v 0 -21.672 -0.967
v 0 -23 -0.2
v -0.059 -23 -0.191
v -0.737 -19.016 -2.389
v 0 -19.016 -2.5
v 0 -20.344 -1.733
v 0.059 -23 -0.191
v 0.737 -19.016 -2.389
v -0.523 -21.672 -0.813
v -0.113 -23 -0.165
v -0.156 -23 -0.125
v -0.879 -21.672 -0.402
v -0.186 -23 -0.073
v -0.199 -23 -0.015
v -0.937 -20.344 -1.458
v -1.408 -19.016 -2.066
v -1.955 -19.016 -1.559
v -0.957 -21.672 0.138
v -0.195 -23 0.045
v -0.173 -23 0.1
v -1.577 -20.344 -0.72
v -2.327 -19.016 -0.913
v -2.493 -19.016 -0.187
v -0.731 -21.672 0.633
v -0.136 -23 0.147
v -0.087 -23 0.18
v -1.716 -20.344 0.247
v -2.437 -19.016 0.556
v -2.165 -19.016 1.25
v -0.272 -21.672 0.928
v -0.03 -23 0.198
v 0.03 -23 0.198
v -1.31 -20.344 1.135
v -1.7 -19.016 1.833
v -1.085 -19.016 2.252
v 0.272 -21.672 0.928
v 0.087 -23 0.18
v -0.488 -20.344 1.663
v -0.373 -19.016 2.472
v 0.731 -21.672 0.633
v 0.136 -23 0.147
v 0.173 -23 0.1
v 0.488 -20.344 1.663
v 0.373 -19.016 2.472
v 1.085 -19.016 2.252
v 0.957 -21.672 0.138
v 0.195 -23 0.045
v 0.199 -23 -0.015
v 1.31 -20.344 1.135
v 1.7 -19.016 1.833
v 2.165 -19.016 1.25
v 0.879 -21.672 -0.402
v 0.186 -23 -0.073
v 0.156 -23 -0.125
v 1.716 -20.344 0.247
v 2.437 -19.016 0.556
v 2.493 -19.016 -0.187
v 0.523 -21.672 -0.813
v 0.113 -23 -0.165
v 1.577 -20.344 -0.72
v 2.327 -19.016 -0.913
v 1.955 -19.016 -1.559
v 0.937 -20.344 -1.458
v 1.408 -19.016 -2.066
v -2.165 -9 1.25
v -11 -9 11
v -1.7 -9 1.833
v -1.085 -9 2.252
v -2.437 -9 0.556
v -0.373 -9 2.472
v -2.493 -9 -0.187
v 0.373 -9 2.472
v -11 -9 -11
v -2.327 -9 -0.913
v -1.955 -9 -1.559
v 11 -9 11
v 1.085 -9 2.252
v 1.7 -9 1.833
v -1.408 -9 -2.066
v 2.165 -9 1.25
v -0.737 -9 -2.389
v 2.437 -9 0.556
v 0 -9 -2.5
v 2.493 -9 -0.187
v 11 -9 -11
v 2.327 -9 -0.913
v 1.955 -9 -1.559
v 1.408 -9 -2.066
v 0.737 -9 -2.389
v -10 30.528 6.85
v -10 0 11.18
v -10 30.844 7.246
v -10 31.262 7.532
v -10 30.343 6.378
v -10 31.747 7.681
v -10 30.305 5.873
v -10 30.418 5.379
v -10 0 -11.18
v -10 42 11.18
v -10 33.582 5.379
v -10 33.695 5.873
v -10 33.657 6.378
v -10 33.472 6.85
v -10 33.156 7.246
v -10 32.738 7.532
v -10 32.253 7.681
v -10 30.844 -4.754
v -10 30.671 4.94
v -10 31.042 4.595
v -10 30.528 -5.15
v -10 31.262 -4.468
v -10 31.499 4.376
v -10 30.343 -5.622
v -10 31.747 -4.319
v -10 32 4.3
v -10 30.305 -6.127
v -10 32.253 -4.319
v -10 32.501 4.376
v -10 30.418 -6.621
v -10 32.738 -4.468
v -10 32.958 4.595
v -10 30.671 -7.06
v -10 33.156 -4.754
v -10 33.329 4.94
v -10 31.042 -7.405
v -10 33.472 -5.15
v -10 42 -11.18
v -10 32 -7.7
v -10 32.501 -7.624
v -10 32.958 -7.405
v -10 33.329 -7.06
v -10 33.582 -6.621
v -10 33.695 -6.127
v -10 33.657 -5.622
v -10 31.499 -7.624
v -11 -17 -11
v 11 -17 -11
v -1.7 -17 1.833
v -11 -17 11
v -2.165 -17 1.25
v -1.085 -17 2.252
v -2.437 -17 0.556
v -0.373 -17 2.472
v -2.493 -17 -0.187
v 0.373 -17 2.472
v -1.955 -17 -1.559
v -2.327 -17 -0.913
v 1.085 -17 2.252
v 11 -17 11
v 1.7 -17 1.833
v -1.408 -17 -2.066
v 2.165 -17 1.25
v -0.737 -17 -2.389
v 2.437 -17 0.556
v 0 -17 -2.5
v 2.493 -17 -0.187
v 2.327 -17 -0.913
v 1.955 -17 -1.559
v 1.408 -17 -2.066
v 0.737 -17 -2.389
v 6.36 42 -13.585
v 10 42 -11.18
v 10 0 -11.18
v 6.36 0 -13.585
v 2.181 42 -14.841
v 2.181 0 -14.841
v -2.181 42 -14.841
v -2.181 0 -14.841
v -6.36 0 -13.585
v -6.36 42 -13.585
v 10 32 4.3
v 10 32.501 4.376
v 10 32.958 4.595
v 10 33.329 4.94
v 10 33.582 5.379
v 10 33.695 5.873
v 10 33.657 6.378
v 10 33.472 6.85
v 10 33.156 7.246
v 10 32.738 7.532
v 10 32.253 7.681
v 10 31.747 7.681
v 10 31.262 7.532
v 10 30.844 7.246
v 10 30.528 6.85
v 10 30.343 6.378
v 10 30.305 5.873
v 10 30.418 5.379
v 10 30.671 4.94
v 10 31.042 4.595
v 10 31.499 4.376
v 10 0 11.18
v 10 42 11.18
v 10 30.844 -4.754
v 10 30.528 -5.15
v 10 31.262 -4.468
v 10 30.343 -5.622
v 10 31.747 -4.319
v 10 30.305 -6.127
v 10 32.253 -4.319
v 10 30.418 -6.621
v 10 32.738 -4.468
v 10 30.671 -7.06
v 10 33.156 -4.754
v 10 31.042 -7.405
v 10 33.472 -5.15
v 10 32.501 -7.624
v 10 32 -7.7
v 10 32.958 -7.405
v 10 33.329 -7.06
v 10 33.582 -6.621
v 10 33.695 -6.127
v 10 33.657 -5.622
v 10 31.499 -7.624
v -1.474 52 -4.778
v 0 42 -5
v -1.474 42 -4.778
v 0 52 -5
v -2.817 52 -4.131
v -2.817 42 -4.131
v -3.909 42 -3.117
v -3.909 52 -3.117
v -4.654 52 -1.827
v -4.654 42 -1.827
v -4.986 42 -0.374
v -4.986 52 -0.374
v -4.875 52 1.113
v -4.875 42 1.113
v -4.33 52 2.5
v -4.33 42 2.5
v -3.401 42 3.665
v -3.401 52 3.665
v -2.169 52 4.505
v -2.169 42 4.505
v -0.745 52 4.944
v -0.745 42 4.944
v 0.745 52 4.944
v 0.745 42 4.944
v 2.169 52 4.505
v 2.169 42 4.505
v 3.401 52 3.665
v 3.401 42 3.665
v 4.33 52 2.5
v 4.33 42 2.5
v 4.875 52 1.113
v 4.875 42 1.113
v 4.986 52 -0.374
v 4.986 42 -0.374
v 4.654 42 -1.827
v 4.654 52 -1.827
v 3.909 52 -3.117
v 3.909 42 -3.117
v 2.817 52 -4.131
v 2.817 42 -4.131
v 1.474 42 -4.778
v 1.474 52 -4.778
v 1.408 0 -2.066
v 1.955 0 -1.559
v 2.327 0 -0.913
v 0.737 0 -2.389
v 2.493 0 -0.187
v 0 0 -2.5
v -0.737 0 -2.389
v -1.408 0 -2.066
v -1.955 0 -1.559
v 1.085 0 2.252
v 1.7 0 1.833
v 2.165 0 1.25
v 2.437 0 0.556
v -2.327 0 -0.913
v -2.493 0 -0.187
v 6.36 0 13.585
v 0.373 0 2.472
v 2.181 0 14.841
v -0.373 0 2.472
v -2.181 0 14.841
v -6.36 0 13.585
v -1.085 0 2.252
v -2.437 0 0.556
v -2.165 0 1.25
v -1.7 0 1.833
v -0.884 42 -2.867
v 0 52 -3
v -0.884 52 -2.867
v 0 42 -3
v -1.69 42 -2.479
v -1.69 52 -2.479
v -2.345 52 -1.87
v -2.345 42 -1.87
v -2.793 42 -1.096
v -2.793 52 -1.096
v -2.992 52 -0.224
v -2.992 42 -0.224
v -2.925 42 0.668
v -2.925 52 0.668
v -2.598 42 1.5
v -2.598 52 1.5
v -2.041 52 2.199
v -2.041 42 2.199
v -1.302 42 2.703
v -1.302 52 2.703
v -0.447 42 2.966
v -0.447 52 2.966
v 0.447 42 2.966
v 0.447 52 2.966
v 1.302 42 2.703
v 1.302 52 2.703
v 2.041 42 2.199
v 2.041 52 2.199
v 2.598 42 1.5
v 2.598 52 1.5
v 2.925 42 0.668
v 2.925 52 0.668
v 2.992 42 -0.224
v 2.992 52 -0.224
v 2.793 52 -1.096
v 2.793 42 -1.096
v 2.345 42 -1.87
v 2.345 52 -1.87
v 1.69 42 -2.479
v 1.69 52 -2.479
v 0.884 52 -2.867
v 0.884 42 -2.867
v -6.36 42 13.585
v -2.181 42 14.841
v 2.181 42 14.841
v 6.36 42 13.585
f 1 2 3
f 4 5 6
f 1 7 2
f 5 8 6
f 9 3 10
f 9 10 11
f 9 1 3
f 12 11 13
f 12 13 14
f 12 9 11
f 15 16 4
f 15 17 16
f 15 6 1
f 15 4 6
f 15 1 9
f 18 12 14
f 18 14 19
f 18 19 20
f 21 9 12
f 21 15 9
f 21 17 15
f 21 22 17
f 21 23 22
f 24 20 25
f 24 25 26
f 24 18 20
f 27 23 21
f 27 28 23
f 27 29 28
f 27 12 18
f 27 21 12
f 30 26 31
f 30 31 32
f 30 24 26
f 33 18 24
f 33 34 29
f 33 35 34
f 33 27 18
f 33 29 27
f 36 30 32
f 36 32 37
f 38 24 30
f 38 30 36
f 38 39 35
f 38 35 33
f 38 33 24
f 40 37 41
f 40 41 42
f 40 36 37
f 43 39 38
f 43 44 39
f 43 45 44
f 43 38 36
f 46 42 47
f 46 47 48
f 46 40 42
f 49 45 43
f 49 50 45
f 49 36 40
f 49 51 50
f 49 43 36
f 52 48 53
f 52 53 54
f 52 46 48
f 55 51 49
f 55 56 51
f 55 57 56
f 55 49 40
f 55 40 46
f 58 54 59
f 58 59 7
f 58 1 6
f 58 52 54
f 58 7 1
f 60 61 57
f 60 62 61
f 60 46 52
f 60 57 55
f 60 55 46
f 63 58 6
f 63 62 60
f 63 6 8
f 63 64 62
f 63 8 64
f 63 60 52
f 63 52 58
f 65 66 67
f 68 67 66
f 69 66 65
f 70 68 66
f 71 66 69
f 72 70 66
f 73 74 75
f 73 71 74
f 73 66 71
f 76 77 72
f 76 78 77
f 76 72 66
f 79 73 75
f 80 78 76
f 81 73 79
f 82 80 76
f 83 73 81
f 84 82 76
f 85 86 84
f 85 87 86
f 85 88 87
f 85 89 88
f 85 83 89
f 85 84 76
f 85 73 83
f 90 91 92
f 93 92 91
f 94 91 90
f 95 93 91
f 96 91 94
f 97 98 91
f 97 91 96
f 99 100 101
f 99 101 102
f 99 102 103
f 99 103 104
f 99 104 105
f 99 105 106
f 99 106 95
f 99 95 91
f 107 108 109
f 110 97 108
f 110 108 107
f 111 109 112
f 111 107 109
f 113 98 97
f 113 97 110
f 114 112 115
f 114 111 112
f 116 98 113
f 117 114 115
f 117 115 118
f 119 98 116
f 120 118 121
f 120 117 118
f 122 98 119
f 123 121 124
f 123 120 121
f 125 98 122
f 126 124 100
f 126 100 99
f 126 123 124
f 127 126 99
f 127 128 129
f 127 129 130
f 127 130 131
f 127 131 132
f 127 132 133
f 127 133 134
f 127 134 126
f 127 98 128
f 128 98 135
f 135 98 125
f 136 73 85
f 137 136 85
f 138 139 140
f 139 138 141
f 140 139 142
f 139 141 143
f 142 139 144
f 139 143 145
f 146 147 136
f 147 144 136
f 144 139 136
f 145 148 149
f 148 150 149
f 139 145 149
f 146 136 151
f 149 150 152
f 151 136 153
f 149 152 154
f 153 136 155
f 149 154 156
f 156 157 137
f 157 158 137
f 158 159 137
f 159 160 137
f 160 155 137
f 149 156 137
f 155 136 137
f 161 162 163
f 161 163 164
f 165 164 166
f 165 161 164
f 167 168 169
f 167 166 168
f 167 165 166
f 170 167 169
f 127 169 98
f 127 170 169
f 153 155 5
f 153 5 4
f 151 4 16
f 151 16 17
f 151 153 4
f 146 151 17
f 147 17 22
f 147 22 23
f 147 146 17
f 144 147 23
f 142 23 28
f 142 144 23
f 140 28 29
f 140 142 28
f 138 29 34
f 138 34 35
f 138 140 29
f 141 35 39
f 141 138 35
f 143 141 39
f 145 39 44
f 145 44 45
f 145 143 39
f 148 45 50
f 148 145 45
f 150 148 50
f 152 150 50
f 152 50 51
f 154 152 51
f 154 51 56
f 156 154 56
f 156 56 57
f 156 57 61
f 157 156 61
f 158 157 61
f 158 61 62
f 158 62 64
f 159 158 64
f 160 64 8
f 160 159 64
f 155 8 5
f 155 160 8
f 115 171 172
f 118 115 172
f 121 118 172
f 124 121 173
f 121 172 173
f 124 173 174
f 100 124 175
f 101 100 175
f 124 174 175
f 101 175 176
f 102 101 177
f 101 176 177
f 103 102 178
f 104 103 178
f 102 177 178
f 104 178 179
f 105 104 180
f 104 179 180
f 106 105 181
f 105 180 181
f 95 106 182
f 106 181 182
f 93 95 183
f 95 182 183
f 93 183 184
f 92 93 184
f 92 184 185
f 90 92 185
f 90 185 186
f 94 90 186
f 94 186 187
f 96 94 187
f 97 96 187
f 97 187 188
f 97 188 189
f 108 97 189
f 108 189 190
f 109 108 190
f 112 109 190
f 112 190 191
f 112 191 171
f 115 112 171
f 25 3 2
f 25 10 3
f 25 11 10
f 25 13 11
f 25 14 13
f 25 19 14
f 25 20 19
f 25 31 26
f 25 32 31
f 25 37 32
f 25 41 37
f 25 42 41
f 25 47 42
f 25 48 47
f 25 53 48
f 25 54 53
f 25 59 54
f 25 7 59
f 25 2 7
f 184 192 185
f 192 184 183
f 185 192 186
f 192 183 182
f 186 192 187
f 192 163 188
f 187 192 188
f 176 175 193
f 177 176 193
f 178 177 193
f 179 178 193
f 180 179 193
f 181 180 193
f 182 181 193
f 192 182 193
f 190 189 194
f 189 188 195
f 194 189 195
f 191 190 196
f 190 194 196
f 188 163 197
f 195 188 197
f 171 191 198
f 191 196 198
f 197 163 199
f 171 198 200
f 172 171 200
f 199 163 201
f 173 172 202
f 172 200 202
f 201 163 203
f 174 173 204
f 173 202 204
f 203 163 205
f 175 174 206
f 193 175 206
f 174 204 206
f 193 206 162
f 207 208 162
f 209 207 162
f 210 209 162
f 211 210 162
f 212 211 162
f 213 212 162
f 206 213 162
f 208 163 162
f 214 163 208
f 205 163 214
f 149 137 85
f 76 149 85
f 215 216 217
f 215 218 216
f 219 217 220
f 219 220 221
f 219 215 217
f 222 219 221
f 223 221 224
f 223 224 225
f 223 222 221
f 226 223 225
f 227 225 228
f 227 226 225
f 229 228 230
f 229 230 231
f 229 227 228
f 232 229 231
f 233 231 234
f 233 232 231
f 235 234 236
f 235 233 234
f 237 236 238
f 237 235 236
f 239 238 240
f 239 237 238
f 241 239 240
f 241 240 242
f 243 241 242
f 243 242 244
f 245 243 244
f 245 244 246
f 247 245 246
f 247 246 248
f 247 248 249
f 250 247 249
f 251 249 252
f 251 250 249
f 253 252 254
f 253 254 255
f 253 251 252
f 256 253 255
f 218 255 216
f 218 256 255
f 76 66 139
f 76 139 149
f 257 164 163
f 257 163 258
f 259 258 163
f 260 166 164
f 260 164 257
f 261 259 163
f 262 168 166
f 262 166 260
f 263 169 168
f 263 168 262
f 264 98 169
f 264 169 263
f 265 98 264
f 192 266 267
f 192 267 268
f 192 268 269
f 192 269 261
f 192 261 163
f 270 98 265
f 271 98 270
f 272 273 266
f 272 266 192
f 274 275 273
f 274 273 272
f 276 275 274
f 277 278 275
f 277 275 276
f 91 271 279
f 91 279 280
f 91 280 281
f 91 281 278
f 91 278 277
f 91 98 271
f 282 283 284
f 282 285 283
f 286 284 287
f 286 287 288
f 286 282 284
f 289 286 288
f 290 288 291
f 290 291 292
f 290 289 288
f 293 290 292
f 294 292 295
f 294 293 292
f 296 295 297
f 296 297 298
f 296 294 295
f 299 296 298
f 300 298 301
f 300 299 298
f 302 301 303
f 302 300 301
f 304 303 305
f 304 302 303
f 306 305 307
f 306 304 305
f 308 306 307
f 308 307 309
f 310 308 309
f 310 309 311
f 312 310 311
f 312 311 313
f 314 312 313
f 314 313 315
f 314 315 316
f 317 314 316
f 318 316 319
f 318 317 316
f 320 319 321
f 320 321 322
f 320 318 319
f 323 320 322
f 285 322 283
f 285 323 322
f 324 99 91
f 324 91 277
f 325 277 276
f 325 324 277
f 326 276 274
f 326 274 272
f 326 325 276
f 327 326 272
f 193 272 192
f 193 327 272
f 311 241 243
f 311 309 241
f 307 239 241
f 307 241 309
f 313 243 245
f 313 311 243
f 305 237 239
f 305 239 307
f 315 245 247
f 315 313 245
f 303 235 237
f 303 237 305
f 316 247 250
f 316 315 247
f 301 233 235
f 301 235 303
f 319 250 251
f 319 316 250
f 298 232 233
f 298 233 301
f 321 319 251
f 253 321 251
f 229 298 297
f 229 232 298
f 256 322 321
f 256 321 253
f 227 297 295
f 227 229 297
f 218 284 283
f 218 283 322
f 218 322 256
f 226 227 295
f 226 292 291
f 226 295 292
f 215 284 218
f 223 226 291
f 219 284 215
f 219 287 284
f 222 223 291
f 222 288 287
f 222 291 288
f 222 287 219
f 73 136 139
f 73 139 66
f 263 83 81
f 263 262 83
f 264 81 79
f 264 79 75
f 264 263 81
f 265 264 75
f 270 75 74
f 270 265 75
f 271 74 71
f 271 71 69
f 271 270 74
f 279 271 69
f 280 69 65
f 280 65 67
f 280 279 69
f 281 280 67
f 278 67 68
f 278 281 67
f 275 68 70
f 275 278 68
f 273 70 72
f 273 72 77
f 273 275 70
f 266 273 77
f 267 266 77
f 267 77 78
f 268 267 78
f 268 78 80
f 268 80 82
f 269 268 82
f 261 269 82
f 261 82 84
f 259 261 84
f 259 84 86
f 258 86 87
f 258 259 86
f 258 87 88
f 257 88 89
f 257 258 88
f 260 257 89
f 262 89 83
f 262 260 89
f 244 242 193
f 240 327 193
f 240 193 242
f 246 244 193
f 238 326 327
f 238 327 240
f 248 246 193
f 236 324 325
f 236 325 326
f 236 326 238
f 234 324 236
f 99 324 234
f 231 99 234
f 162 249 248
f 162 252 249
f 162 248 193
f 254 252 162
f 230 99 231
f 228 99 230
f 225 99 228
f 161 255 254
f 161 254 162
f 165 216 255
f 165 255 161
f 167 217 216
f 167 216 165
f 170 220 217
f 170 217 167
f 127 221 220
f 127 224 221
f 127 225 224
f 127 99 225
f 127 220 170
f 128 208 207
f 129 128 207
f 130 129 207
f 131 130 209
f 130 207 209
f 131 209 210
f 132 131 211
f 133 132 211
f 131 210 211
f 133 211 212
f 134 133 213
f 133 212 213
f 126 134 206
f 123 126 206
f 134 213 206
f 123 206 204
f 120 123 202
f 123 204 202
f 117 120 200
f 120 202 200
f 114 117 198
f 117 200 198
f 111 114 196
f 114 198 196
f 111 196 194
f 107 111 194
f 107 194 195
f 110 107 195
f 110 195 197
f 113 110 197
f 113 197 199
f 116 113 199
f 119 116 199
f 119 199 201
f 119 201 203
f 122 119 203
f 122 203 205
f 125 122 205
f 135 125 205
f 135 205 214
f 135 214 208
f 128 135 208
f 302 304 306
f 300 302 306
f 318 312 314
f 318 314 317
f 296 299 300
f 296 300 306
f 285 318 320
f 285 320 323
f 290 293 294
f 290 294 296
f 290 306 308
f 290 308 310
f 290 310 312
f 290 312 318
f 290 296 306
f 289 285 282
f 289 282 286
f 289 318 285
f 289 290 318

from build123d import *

# Parameters (mm, degrees)
CUT_EXTRUDE_2_DEPTH      = 57.160484328
CUT_EXTRUDE_2_DEPTH_BACK = 57.160484328
SKETCH_2_OUTSIDE_W       = 49.234
SKETCH_2_OUTSIDE_H       = 94.234
SKETCH_2_OUTSIDE_W_2     = 20
SKETCH_2_OUTSIDE_H_2     = 75
EXTRUDE_1_DEPTH          = 11
EXTRUDE_1_DEPTH_BACK     = 11
SKETCH_4_W               = 22
SKETCH_4_H               = 8
SKETCH_5_R               = 1.7
CUT_EXTRUDE_3_DEPTH      = 59.051701095


with BuildPart() as part:
    # 草图1 → 旋转1 (revolve)
    with BuildSketch(Plane.XY):
        Polygon((2.5, 0), (15, 0), (15, 42), (5, 42), (5, 52), (3, 52), (3, 42), (0, 42), (0, 0), (0, -23), (0.2, -23), (2.5, -19.016283143), align=None)
    revolve(axis=Axis((0, 0, 0), (0, 1, 0)))

    # 草图2 outside → 切除-拉伸2 (cut, two sides: drawn at the far end of the back side and taken through both)
    with BuildSketch(Plane.XY.offset(-CUT_EXTRUDE_2_DEPTH_BACK)):
        with Locations((0, 14.5)):
            Rectangle(SKETCH_2_OUTSIDE_W, SKETCH_2_OUTSIDE_H)
        with Locations((0, 14.5)):
            Rectangle(SKETCH_2_OUTSIDE_W_2, SKETCH_2_OUTSIDE_H_2, mode=Mode.SUBTRACT)
    extrude(amount=CUT_EXTRUDE_2_DEPTH + CUT_EXTRUDE_2_DEPTH_BACK, mode=Mode.SUBTRACT)

    # 草图4 → 凸台-拉伸1 (add, two sides: drawn at the far end of the back side and taken through both)
    with BuildSketch(Plane.XY.offset(-EXTRUDE_1_DEPTH_BACK)):
        with Locations((0, -13)):
            Rectangle(SKETCH_4_W, SKETCH_4_H)
    extrude(amount=EXTRUDE_1_DEPTH + EXTRUDE_1_DEPTH_BACK)

    # 草图5 → 切除-拉伸3 (cut, through all)
    with BuildSketch(Plane(origin=(10, 0, 0), x_dir=(0, 0, -1), z_dir=(1, 0, 0))):
        with Locations((-6, 32)):
            Circle(SKETCH_5_R)
        with Locations((6, 32)):
            Circle(SKETCH_5_R)
    extrude(amount=-CUT_EXTRUDE_3_DEPTH, mode=Mode.SUBTRACT)


solid = part.part
